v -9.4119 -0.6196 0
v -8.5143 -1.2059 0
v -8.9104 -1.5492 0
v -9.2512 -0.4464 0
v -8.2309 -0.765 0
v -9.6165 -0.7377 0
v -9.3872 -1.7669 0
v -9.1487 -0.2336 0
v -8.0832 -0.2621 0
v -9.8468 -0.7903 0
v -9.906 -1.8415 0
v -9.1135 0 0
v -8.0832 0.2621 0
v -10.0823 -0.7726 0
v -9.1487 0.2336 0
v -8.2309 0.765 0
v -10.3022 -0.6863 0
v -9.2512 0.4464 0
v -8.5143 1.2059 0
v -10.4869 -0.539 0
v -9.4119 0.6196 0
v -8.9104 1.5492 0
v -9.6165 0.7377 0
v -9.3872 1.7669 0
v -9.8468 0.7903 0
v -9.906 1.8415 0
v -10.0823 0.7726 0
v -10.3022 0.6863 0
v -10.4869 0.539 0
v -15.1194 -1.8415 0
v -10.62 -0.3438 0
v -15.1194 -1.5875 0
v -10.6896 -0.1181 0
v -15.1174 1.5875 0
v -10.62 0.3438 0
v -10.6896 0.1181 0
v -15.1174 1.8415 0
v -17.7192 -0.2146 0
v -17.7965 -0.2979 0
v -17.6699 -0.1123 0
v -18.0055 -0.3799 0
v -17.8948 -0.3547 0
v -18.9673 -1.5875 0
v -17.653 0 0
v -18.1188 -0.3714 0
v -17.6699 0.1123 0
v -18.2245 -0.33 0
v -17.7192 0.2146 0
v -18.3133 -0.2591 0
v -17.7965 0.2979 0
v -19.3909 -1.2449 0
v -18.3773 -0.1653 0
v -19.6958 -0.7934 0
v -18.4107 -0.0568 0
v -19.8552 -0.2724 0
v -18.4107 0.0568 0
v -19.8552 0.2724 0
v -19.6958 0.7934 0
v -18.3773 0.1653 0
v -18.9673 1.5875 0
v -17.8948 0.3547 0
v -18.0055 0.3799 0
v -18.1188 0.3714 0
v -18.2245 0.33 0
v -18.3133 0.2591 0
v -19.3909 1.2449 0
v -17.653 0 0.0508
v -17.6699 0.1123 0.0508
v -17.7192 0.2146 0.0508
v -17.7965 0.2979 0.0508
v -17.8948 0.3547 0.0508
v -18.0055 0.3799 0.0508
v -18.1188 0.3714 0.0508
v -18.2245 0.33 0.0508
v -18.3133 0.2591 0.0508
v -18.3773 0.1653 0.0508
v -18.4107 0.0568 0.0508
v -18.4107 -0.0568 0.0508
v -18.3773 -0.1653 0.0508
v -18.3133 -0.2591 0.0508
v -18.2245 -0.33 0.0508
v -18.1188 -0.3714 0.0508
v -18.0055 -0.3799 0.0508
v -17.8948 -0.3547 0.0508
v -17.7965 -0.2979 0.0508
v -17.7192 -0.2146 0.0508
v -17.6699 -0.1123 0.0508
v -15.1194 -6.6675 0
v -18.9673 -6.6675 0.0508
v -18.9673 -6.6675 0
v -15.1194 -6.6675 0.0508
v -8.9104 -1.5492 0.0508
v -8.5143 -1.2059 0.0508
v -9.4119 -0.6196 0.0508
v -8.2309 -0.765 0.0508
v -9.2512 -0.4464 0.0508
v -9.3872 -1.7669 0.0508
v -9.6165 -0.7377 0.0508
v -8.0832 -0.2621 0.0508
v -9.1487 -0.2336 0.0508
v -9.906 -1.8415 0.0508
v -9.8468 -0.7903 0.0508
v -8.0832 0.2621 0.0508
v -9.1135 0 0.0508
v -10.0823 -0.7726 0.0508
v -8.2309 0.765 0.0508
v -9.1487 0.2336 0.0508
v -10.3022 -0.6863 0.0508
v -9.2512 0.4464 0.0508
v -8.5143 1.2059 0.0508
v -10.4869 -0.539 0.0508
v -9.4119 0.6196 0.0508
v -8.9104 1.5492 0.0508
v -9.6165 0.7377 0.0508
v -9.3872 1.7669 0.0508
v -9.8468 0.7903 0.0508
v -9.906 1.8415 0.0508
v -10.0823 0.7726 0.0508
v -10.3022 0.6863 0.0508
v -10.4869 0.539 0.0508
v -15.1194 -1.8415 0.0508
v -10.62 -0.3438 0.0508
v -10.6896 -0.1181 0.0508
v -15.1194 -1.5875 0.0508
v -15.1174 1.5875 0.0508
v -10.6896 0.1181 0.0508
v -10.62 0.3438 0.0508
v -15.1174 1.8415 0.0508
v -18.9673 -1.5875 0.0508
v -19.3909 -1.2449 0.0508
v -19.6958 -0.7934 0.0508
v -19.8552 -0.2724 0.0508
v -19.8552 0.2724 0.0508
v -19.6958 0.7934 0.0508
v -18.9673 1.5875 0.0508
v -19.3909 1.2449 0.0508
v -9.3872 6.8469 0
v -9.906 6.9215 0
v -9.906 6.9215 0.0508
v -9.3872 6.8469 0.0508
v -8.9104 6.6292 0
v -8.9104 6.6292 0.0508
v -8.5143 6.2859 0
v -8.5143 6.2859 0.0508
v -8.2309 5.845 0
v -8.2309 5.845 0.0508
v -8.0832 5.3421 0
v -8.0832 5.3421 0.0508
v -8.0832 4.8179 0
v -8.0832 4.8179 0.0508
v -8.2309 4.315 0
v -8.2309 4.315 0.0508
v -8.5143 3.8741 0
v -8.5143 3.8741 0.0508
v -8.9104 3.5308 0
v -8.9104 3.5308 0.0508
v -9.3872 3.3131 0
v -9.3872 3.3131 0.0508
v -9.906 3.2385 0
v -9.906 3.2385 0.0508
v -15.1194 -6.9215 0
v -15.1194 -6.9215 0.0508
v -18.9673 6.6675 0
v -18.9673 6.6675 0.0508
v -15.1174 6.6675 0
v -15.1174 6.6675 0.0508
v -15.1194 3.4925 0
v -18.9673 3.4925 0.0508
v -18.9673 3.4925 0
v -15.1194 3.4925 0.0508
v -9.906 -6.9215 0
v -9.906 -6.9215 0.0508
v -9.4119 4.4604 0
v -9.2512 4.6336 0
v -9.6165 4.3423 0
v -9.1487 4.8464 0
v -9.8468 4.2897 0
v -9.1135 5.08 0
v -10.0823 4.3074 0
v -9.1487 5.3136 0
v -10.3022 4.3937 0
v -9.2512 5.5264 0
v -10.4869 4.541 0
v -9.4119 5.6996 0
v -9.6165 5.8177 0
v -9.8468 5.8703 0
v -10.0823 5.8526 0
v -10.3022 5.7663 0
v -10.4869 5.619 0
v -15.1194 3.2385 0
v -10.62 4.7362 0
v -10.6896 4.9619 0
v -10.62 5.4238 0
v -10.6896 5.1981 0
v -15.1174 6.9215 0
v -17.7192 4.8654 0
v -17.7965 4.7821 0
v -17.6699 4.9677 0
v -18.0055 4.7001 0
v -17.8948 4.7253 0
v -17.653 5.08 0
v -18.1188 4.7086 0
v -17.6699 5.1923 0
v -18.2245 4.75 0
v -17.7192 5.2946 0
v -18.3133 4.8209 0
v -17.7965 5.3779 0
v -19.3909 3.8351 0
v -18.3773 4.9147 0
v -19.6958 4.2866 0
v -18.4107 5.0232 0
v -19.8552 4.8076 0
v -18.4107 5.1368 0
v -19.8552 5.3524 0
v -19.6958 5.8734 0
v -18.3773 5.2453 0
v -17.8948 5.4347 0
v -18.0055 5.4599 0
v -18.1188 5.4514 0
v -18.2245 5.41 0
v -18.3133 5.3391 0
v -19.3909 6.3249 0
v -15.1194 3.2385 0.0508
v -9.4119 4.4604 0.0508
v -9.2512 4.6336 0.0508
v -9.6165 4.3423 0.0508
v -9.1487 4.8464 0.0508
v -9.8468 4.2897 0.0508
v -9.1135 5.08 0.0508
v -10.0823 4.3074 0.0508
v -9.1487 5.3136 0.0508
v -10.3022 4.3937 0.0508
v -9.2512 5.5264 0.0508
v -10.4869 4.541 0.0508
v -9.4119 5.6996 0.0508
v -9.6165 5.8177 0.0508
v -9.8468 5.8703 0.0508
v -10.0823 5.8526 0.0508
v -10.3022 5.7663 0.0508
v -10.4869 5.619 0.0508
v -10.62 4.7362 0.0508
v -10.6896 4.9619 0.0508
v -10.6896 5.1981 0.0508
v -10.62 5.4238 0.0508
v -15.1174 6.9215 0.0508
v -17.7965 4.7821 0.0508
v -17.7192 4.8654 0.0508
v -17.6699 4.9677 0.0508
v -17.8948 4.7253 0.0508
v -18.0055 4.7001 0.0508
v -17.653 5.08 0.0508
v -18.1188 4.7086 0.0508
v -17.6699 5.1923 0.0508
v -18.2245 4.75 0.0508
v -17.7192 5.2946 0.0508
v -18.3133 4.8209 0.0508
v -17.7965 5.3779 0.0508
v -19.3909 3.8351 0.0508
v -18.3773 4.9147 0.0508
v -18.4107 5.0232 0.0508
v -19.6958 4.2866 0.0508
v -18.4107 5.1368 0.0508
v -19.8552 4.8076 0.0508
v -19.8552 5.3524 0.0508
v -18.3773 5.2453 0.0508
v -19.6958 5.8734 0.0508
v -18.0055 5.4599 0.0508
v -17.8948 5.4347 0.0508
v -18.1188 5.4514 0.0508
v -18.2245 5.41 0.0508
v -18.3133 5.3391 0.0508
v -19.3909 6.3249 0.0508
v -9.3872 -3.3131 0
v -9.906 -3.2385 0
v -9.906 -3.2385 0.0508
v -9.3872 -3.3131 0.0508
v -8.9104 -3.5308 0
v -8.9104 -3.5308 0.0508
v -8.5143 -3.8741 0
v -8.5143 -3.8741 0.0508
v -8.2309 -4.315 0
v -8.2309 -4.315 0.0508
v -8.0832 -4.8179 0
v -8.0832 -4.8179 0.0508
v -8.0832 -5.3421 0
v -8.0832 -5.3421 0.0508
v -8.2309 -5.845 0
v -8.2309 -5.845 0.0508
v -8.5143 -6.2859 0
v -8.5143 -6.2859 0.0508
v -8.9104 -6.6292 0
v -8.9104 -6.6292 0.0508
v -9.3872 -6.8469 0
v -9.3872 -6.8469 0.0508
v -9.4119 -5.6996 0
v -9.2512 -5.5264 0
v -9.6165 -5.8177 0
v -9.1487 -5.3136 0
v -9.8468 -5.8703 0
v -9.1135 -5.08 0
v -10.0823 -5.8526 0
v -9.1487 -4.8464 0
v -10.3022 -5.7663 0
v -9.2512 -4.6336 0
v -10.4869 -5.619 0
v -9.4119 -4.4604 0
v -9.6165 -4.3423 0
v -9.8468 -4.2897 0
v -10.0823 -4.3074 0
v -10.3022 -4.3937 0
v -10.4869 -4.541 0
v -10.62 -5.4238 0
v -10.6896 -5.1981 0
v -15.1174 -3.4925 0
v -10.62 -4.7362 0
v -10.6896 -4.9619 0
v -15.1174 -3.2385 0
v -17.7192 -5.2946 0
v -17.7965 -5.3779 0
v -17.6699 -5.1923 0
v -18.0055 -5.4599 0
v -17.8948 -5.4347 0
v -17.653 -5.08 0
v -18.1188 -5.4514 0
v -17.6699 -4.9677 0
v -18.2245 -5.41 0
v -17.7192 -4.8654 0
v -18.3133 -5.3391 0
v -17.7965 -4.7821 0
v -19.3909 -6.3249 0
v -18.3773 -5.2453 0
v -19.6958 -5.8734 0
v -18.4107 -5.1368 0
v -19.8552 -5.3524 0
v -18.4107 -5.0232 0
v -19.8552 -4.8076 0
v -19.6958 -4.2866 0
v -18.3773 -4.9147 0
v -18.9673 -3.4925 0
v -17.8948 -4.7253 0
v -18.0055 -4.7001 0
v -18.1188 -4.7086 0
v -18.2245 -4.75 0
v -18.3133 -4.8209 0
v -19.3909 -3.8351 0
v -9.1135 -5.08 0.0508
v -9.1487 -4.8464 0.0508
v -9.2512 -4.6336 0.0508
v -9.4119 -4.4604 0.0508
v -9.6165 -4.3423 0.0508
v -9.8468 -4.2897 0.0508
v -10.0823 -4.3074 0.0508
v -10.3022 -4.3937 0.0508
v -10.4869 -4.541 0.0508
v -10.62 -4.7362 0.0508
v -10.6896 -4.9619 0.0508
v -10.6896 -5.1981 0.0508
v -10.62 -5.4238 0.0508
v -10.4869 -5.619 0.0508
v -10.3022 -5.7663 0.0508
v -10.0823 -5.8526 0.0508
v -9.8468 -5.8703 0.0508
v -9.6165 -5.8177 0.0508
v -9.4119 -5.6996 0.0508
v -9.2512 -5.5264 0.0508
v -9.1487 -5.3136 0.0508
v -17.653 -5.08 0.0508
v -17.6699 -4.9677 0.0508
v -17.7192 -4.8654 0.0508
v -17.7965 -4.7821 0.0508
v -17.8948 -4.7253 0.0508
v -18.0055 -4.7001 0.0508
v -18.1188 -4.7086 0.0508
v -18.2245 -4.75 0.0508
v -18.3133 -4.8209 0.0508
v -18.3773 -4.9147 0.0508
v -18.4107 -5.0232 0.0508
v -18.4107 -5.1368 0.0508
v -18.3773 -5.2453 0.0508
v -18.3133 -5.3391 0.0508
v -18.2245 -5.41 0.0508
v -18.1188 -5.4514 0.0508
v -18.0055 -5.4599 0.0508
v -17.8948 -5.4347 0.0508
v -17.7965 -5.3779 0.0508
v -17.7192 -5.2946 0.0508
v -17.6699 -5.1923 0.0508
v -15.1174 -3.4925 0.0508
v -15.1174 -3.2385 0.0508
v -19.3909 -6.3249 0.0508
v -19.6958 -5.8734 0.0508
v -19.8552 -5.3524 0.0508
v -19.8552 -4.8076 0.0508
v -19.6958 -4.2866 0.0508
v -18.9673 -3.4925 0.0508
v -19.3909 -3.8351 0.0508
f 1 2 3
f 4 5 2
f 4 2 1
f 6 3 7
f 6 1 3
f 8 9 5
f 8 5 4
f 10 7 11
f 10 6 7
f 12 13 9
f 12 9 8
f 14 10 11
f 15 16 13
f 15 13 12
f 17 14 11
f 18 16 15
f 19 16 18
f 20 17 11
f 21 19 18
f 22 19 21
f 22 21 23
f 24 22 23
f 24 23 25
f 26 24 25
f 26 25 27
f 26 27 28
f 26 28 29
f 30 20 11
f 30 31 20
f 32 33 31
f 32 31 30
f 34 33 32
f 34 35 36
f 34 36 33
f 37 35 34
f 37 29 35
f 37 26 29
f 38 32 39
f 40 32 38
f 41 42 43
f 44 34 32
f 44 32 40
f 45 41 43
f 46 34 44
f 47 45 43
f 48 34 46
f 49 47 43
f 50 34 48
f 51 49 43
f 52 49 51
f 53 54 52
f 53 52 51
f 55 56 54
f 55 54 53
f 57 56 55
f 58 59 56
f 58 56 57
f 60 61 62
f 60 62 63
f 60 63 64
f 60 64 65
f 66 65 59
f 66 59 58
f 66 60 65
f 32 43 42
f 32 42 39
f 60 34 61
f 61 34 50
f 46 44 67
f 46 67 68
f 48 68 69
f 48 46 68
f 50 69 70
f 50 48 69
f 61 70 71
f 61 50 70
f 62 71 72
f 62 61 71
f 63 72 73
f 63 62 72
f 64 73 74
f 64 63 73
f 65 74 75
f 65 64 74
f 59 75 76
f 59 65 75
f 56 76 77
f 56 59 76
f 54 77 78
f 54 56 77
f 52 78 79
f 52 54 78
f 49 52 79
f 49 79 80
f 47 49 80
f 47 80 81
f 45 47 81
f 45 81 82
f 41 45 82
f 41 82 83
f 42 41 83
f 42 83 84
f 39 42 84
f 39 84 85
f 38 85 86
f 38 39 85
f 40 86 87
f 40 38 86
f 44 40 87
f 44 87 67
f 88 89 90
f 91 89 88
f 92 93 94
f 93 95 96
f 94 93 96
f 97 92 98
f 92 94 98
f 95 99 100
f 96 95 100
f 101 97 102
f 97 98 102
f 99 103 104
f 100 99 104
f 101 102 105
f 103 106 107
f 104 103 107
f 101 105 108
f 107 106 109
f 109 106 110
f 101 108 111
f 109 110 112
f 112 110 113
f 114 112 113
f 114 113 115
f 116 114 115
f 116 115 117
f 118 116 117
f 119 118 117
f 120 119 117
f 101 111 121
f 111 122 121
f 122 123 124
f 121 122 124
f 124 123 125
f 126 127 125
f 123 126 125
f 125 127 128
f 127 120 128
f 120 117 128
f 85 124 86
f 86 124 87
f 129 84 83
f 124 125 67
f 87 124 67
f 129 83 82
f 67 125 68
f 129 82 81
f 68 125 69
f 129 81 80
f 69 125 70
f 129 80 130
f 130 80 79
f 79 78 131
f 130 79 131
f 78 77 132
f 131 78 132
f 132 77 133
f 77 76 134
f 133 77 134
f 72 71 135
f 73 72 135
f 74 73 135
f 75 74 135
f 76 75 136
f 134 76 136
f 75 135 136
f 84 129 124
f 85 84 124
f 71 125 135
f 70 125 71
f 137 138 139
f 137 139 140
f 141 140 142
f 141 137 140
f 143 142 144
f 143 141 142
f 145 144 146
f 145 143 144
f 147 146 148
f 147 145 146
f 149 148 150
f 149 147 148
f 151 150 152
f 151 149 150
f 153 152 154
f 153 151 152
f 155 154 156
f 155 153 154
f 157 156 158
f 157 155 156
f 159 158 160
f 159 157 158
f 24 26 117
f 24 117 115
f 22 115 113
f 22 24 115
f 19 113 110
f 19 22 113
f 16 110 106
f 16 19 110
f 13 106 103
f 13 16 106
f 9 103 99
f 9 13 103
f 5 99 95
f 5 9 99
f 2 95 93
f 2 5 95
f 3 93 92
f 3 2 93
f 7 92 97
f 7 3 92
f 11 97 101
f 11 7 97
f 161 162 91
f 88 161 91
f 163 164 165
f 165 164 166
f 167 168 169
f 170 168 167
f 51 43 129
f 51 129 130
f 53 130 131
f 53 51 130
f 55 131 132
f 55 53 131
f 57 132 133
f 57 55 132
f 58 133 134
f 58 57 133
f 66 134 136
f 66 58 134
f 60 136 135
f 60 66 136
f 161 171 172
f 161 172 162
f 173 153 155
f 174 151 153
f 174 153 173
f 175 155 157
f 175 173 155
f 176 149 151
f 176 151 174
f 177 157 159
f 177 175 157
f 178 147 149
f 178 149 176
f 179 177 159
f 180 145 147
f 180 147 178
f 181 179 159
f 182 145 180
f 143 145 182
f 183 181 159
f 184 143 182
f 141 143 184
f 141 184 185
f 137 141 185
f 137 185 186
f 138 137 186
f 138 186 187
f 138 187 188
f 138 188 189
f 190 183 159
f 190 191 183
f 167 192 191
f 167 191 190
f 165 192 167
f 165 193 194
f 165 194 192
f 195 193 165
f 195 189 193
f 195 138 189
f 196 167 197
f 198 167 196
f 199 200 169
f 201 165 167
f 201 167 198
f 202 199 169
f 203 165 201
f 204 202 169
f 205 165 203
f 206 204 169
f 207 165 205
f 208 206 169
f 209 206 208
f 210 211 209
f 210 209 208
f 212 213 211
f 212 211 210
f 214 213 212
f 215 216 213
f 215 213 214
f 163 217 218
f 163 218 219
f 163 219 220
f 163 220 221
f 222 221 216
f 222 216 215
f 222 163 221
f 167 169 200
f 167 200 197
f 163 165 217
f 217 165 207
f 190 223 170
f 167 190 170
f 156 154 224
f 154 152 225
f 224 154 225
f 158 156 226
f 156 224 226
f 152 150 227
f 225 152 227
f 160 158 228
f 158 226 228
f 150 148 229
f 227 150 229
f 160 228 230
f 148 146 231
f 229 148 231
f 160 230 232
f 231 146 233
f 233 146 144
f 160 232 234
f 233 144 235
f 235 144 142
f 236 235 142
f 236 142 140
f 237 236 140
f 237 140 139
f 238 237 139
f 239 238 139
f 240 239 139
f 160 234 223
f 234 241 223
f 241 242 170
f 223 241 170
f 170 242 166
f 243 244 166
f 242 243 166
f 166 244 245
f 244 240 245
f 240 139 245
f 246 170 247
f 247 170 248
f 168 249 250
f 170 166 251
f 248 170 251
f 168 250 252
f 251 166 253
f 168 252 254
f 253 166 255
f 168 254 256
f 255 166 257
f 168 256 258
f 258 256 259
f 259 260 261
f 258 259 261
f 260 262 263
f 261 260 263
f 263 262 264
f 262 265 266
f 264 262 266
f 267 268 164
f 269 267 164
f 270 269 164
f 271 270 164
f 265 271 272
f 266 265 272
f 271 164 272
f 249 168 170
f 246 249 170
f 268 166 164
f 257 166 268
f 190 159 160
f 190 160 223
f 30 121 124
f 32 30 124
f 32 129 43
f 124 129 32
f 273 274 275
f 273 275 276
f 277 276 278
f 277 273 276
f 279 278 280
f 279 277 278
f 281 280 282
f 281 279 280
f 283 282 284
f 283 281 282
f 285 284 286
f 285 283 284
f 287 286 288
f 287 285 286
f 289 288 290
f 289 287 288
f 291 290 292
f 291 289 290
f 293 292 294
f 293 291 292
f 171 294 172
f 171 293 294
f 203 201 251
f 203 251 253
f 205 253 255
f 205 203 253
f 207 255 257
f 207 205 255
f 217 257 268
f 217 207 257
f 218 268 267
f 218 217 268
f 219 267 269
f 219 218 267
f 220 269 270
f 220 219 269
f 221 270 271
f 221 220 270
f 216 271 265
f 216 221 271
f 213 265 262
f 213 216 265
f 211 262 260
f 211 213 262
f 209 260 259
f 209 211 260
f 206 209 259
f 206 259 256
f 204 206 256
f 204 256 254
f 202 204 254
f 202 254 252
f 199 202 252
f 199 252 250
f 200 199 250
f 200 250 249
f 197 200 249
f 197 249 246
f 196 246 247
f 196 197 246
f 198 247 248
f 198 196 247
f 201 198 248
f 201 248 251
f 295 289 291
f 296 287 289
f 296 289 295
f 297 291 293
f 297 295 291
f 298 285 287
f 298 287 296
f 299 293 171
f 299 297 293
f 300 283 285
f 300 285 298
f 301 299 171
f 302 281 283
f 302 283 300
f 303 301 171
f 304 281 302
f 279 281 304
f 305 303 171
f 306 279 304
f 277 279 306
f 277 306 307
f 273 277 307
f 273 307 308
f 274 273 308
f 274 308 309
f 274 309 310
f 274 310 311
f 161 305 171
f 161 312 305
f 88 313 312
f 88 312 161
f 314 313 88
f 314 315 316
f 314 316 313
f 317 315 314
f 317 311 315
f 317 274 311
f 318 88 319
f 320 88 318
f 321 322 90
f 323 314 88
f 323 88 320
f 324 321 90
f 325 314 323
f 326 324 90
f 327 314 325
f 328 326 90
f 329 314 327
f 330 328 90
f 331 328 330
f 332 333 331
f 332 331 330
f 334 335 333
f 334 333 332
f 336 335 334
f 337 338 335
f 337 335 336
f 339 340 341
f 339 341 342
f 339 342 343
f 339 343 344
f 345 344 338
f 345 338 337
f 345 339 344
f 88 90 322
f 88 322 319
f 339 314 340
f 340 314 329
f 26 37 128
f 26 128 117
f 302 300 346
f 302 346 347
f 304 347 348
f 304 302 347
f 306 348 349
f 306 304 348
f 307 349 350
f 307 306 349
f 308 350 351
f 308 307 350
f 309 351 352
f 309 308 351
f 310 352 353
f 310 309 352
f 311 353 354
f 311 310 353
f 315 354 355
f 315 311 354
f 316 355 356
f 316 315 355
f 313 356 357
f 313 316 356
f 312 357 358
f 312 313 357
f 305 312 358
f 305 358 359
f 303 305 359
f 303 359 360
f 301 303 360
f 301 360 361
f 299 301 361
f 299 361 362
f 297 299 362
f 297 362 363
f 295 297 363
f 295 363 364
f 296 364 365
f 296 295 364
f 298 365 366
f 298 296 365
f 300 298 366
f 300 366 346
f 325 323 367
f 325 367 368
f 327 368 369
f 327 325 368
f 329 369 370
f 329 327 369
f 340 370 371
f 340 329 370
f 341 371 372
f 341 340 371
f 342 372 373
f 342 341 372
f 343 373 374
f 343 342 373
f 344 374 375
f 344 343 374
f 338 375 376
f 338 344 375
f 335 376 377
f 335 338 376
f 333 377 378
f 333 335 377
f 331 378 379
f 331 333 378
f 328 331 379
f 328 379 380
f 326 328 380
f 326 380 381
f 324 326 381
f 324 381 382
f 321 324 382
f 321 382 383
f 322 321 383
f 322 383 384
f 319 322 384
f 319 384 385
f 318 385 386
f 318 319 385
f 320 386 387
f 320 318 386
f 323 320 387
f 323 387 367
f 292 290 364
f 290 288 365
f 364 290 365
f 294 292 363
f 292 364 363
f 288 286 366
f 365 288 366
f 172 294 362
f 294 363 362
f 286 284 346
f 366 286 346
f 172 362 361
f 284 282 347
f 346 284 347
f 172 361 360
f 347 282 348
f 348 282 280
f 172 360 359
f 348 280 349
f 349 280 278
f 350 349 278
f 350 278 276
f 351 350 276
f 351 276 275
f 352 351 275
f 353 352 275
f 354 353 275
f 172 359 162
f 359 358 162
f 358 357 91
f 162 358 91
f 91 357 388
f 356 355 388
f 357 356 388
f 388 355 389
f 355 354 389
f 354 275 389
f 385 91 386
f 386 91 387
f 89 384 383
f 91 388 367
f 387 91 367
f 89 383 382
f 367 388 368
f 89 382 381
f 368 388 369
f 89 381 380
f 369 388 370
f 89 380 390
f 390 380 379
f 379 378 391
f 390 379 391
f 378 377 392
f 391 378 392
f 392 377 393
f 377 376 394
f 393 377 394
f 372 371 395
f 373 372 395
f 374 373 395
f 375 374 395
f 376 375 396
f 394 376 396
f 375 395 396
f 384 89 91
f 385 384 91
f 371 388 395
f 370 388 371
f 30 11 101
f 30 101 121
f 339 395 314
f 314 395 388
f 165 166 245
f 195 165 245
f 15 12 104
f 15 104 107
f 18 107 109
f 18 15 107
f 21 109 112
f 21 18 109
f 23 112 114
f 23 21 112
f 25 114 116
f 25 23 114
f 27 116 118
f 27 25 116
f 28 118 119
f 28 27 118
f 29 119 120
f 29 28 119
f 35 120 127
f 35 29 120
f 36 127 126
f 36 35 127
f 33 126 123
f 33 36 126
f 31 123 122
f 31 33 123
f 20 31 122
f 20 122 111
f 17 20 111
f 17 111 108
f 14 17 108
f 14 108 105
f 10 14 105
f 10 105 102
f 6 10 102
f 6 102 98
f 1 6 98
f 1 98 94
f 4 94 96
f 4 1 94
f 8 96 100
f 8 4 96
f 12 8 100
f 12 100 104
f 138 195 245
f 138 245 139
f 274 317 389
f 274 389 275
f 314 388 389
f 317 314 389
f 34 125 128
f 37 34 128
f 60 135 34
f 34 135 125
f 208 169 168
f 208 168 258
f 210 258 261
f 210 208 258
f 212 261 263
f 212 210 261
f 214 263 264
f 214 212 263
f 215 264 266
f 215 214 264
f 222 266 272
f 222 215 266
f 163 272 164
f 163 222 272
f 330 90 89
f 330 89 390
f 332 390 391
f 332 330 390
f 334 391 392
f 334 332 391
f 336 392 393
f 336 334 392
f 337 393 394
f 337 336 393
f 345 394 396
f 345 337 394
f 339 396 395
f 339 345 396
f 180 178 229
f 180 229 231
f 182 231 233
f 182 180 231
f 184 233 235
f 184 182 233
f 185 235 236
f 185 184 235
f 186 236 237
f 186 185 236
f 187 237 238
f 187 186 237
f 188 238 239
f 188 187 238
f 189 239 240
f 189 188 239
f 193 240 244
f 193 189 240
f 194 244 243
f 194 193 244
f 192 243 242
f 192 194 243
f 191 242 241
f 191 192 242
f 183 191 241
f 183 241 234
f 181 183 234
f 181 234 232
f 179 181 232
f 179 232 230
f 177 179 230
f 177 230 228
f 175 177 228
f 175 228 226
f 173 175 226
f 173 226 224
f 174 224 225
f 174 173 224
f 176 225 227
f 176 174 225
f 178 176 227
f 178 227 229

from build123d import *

# Parameters (mm, degrees)
SKETCH1_R           = 0.381
SKETCH1_R_2         = 0.79248
BOSS_EXTRUDE1_DEPTH = 0.0508
SKETCH2_W           = 4.807264271
SKETCH2_H           = 0.712403932
SKETCH2_W_2         = 4.805234364
SKETCH2_H_2         = 0.796216159
CUT_EXTRUDE1_DEPTH  = 0.0508
LPATTERN1_COUNT     = 3
LPATTERN1_PITCH     = 5.08


with BuildPart() as part:
    # Sketch1 → Boss-Extrude1 (new body)
    with BuildSketch(Plane.XY):
        with BuildLine():
            Line((-9.906, 3.2385), (-18.034, 3.2385))
            ThreePointArc((-18.034, 3.2385), (-19.8755, 5.08), (-18.034, 6.9215))
            Line((-18.034, 6.9215), (-9.906, 6.9215))
            ThreePointArc((-9.906, 6.9215), (-8.0645, 5.08), (-9.906, 3.2385))
        make_face()
        with Locations((-18.034, 5.08)):
            Circle(SKETCH1_R, mode=Mode.SUBTRACT)
        with Locations((-9.906, 5.08)):
            Circle(SKETCH1_R_2, mode=Mode.SUBTRACT)
    extrude(amount=BOSS_EXTRUDE1_DEPTH)

    # Sketch2 → Cut-Extrude1 (cut)
    with BuildSketch(Plane.XY.offset(0.0508)):
        with Locations((-17.521048287, 7.023701966)):
            Rectangle(SKETCH2_W, SKETCH2_H)
        with Locations((-17.52206324, 3.094391921)):
            Rectangle(SKETCH2_W_2, SKETCH2_H_2)
    extrude(amount=-CUT_EXTRUDE1_DEPTH, mode=Mode.SUBTRACT)


with BuildPart() as lpattern1_1:
    # LPattern1: pattern copy
    add(part.part.moved(Location(Vector(0, -1, 0) * (1 * LPATTERN1_PITCH))))


with BuildPart() as lpattern1_2:
    # LPattern1: pattern copy
    add(part.part.moved(Location(Vector(0, -1, 0) * (2 * LPATTERN1_PITCH))))


solid = Compound([part.part, lpattern1_1.part, lpattern1_2.part])
